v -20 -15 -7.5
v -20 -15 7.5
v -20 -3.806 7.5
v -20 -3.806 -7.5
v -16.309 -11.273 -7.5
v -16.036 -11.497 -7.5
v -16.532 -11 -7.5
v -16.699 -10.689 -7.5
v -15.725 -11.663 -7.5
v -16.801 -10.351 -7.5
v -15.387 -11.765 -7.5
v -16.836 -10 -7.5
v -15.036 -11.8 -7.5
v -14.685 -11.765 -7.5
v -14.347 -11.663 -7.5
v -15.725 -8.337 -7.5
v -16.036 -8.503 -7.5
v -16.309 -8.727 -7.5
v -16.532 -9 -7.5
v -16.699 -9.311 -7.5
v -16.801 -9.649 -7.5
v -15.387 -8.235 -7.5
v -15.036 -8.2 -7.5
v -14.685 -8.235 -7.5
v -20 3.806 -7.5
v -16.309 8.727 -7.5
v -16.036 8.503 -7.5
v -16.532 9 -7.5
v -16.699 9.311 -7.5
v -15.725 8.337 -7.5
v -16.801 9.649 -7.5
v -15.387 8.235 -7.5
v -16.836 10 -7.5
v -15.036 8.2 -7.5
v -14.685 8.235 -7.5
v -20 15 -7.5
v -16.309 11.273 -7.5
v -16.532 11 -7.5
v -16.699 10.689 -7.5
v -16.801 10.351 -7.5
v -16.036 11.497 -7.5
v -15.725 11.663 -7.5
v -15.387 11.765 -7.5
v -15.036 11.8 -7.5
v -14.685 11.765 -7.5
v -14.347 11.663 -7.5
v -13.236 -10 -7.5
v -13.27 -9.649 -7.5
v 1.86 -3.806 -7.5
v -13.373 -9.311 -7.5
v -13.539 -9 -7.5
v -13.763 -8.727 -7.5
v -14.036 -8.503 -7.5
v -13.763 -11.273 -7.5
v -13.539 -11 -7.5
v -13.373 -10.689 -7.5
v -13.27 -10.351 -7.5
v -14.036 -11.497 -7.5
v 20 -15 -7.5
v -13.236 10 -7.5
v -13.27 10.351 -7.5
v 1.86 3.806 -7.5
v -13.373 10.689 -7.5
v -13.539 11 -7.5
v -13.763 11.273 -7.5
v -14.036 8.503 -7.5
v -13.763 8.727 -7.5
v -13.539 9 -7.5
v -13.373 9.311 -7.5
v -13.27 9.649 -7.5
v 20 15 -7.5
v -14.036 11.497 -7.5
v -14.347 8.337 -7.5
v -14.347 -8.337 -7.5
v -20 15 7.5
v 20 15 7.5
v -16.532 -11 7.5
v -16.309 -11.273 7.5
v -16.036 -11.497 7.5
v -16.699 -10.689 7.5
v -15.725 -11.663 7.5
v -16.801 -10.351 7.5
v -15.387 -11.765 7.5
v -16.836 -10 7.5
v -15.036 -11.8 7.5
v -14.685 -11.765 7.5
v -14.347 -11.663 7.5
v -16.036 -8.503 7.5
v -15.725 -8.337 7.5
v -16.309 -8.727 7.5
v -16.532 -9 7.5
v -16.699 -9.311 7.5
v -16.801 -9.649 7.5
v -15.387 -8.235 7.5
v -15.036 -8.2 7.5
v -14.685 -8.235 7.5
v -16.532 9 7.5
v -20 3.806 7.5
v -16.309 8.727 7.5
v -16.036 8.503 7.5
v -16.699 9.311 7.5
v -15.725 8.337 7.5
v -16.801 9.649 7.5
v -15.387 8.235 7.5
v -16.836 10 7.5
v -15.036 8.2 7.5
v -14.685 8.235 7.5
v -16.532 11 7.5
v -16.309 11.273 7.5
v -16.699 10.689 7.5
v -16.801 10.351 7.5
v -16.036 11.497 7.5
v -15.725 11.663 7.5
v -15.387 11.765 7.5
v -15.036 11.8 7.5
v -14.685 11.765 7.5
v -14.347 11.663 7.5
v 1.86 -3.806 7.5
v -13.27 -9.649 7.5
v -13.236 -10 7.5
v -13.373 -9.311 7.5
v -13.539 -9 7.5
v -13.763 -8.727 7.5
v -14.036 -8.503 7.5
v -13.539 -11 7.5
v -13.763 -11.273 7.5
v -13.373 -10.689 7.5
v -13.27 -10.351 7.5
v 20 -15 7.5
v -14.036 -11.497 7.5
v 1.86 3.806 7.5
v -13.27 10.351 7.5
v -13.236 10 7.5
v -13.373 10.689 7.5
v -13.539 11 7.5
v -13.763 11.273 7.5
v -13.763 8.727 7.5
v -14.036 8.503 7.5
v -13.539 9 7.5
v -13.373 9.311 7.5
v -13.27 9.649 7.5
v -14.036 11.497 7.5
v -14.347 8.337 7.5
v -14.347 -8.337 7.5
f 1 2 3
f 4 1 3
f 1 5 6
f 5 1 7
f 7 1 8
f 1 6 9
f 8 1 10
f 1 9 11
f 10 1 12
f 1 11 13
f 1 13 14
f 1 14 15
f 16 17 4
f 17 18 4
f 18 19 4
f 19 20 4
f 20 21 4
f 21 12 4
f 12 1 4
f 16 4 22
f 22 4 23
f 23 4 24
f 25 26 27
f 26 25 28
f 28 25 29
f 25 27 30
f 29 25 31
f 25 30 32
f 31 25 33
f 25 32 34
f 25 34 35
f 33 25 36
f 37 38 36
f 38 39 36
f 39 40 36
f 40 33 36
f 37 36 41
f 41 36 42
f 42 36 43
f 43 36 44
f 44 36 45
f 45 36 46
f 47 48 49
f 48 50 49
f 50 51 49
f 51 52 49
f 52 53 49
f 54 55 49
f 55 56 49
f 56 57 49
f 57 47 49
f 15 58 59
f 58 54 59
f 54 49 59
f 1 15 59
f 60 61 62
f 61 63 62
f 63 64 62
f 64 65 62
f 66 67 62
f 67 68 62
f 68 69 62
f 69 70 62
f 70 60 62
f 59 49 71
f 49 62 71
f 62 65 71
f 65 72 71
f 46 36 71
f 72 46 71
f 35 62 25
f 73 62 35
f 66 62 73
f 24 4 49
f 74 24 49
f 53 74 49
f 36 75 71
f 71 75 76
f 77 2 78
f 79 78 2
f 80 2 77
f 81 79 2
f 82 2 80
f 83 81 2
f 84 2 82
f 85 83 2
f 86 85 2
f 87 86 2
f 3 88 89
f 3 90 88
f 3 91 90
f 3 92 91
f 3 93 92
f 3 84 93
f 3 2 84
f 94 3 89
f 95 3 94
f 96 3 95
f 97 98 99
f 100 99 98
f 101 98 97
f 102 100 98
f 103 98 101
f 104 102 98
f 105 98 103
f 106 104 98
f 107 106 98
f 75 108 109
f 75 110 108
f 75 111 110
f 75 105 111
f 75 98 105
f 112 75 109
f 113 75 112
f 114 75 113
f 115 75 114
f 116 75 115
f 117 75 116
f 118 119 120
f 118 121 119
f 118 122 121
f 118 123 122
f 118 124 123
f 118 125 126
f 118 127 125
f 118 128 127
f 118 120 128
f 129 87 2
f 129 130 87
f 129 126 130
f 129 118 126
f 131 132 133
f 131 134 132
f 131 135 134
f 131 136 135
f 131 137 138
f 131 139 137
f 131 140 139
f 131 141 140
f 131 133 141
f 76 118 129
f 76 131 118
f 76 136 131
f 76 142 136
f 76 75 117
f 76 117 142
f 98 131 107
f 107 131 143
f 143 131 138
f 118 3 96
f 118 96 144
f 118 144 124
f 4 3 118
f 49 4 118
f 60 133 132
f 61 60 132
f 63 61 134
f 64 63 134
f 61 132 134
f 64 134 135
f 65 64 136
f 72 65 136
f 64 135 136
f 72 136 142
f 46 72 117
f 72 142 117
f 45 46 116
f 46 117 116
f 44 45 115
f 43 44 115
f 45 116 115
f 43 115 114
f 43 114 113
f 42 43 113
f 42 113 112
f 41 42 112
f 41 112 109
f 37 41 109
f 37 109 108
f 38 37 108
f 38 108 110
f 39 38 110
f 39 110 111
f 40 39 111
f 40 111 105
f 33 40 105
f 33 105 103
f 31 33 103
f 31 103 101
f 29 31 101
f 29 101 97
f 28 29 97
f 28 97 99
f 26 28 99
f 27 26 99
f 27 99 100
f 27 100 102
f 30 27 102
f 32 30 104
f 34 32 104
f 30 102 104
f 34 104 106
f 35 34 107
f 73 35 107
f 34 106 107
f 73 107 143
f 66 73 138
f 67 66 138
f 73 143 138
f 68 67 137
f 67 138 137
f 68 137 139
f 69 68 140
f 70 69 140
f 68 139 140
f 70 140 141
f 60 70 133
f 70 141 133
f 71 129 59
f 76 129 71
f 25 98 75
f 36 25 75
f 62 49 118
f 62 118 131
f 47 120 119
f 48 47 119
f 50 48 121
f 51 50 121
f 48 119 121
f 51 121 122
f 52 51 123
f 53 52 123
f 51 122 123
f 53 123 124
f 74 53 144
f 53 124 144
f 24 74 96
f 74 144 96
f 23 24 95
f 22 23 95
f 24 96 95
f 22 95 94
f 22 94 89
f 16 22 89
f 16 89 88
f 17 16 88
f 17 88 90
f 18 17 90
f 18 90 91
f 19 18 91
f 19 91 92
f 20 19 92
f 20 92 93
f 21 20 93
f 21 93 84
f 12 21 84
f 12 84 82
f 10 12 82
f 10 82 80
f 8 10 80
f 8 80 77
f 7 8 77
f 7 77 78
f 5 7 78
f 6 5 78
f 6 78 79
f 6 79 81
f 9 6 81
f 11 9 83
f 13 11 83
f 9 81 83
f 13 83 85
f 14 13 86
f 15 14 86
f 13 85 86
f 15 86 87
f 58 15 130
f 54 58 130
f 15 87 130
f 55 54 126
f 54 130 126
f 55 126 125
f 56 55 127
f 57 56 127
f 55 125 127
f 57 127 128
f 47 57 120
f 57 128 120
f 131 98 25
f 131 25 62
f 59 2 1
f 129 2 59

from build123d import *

# Parameters (mm, degrees)
F0_W     = 40
F0_H     = 30
F1_DEPTH = 7.5
F2_W     = 21.86022
F2_H     = 7.61192
F3_DEPTH = 25
F4_R     = 1.8
F5_DEPTH = 20


with BuildPart() as f1:
    # F0 (on Top) → F1 (new body, symmetric)
    with BuildSketch(Plane.XY):
        Rectangle(F0_W, F0_H)
    extrude(amount=F1_DEPTH, both=True)

    # F2 (on face) → F3 (cut)
    with BuildSketch(Plane.XY.offset(7.5)):
        with Locations((-9.06989, 0)):
            Rectangle(F2_W, F2_H)
    extrude(amount=-F3_DEPTH, mode=Mode.SUBTRACT)

    # F4 (on face) → F5 (cut)
    with BuildSketch(Plane.XY.offset(7.5)):
        with Locations((-15.035771, -10)):
            Circle(F4_R)
        with Locations((-15.035771, 10)):
            Circle(F4_R)
    extrude(amount=-F5_DEPTH, mode=Mode.SUBTRACT)


solid = f1.part
